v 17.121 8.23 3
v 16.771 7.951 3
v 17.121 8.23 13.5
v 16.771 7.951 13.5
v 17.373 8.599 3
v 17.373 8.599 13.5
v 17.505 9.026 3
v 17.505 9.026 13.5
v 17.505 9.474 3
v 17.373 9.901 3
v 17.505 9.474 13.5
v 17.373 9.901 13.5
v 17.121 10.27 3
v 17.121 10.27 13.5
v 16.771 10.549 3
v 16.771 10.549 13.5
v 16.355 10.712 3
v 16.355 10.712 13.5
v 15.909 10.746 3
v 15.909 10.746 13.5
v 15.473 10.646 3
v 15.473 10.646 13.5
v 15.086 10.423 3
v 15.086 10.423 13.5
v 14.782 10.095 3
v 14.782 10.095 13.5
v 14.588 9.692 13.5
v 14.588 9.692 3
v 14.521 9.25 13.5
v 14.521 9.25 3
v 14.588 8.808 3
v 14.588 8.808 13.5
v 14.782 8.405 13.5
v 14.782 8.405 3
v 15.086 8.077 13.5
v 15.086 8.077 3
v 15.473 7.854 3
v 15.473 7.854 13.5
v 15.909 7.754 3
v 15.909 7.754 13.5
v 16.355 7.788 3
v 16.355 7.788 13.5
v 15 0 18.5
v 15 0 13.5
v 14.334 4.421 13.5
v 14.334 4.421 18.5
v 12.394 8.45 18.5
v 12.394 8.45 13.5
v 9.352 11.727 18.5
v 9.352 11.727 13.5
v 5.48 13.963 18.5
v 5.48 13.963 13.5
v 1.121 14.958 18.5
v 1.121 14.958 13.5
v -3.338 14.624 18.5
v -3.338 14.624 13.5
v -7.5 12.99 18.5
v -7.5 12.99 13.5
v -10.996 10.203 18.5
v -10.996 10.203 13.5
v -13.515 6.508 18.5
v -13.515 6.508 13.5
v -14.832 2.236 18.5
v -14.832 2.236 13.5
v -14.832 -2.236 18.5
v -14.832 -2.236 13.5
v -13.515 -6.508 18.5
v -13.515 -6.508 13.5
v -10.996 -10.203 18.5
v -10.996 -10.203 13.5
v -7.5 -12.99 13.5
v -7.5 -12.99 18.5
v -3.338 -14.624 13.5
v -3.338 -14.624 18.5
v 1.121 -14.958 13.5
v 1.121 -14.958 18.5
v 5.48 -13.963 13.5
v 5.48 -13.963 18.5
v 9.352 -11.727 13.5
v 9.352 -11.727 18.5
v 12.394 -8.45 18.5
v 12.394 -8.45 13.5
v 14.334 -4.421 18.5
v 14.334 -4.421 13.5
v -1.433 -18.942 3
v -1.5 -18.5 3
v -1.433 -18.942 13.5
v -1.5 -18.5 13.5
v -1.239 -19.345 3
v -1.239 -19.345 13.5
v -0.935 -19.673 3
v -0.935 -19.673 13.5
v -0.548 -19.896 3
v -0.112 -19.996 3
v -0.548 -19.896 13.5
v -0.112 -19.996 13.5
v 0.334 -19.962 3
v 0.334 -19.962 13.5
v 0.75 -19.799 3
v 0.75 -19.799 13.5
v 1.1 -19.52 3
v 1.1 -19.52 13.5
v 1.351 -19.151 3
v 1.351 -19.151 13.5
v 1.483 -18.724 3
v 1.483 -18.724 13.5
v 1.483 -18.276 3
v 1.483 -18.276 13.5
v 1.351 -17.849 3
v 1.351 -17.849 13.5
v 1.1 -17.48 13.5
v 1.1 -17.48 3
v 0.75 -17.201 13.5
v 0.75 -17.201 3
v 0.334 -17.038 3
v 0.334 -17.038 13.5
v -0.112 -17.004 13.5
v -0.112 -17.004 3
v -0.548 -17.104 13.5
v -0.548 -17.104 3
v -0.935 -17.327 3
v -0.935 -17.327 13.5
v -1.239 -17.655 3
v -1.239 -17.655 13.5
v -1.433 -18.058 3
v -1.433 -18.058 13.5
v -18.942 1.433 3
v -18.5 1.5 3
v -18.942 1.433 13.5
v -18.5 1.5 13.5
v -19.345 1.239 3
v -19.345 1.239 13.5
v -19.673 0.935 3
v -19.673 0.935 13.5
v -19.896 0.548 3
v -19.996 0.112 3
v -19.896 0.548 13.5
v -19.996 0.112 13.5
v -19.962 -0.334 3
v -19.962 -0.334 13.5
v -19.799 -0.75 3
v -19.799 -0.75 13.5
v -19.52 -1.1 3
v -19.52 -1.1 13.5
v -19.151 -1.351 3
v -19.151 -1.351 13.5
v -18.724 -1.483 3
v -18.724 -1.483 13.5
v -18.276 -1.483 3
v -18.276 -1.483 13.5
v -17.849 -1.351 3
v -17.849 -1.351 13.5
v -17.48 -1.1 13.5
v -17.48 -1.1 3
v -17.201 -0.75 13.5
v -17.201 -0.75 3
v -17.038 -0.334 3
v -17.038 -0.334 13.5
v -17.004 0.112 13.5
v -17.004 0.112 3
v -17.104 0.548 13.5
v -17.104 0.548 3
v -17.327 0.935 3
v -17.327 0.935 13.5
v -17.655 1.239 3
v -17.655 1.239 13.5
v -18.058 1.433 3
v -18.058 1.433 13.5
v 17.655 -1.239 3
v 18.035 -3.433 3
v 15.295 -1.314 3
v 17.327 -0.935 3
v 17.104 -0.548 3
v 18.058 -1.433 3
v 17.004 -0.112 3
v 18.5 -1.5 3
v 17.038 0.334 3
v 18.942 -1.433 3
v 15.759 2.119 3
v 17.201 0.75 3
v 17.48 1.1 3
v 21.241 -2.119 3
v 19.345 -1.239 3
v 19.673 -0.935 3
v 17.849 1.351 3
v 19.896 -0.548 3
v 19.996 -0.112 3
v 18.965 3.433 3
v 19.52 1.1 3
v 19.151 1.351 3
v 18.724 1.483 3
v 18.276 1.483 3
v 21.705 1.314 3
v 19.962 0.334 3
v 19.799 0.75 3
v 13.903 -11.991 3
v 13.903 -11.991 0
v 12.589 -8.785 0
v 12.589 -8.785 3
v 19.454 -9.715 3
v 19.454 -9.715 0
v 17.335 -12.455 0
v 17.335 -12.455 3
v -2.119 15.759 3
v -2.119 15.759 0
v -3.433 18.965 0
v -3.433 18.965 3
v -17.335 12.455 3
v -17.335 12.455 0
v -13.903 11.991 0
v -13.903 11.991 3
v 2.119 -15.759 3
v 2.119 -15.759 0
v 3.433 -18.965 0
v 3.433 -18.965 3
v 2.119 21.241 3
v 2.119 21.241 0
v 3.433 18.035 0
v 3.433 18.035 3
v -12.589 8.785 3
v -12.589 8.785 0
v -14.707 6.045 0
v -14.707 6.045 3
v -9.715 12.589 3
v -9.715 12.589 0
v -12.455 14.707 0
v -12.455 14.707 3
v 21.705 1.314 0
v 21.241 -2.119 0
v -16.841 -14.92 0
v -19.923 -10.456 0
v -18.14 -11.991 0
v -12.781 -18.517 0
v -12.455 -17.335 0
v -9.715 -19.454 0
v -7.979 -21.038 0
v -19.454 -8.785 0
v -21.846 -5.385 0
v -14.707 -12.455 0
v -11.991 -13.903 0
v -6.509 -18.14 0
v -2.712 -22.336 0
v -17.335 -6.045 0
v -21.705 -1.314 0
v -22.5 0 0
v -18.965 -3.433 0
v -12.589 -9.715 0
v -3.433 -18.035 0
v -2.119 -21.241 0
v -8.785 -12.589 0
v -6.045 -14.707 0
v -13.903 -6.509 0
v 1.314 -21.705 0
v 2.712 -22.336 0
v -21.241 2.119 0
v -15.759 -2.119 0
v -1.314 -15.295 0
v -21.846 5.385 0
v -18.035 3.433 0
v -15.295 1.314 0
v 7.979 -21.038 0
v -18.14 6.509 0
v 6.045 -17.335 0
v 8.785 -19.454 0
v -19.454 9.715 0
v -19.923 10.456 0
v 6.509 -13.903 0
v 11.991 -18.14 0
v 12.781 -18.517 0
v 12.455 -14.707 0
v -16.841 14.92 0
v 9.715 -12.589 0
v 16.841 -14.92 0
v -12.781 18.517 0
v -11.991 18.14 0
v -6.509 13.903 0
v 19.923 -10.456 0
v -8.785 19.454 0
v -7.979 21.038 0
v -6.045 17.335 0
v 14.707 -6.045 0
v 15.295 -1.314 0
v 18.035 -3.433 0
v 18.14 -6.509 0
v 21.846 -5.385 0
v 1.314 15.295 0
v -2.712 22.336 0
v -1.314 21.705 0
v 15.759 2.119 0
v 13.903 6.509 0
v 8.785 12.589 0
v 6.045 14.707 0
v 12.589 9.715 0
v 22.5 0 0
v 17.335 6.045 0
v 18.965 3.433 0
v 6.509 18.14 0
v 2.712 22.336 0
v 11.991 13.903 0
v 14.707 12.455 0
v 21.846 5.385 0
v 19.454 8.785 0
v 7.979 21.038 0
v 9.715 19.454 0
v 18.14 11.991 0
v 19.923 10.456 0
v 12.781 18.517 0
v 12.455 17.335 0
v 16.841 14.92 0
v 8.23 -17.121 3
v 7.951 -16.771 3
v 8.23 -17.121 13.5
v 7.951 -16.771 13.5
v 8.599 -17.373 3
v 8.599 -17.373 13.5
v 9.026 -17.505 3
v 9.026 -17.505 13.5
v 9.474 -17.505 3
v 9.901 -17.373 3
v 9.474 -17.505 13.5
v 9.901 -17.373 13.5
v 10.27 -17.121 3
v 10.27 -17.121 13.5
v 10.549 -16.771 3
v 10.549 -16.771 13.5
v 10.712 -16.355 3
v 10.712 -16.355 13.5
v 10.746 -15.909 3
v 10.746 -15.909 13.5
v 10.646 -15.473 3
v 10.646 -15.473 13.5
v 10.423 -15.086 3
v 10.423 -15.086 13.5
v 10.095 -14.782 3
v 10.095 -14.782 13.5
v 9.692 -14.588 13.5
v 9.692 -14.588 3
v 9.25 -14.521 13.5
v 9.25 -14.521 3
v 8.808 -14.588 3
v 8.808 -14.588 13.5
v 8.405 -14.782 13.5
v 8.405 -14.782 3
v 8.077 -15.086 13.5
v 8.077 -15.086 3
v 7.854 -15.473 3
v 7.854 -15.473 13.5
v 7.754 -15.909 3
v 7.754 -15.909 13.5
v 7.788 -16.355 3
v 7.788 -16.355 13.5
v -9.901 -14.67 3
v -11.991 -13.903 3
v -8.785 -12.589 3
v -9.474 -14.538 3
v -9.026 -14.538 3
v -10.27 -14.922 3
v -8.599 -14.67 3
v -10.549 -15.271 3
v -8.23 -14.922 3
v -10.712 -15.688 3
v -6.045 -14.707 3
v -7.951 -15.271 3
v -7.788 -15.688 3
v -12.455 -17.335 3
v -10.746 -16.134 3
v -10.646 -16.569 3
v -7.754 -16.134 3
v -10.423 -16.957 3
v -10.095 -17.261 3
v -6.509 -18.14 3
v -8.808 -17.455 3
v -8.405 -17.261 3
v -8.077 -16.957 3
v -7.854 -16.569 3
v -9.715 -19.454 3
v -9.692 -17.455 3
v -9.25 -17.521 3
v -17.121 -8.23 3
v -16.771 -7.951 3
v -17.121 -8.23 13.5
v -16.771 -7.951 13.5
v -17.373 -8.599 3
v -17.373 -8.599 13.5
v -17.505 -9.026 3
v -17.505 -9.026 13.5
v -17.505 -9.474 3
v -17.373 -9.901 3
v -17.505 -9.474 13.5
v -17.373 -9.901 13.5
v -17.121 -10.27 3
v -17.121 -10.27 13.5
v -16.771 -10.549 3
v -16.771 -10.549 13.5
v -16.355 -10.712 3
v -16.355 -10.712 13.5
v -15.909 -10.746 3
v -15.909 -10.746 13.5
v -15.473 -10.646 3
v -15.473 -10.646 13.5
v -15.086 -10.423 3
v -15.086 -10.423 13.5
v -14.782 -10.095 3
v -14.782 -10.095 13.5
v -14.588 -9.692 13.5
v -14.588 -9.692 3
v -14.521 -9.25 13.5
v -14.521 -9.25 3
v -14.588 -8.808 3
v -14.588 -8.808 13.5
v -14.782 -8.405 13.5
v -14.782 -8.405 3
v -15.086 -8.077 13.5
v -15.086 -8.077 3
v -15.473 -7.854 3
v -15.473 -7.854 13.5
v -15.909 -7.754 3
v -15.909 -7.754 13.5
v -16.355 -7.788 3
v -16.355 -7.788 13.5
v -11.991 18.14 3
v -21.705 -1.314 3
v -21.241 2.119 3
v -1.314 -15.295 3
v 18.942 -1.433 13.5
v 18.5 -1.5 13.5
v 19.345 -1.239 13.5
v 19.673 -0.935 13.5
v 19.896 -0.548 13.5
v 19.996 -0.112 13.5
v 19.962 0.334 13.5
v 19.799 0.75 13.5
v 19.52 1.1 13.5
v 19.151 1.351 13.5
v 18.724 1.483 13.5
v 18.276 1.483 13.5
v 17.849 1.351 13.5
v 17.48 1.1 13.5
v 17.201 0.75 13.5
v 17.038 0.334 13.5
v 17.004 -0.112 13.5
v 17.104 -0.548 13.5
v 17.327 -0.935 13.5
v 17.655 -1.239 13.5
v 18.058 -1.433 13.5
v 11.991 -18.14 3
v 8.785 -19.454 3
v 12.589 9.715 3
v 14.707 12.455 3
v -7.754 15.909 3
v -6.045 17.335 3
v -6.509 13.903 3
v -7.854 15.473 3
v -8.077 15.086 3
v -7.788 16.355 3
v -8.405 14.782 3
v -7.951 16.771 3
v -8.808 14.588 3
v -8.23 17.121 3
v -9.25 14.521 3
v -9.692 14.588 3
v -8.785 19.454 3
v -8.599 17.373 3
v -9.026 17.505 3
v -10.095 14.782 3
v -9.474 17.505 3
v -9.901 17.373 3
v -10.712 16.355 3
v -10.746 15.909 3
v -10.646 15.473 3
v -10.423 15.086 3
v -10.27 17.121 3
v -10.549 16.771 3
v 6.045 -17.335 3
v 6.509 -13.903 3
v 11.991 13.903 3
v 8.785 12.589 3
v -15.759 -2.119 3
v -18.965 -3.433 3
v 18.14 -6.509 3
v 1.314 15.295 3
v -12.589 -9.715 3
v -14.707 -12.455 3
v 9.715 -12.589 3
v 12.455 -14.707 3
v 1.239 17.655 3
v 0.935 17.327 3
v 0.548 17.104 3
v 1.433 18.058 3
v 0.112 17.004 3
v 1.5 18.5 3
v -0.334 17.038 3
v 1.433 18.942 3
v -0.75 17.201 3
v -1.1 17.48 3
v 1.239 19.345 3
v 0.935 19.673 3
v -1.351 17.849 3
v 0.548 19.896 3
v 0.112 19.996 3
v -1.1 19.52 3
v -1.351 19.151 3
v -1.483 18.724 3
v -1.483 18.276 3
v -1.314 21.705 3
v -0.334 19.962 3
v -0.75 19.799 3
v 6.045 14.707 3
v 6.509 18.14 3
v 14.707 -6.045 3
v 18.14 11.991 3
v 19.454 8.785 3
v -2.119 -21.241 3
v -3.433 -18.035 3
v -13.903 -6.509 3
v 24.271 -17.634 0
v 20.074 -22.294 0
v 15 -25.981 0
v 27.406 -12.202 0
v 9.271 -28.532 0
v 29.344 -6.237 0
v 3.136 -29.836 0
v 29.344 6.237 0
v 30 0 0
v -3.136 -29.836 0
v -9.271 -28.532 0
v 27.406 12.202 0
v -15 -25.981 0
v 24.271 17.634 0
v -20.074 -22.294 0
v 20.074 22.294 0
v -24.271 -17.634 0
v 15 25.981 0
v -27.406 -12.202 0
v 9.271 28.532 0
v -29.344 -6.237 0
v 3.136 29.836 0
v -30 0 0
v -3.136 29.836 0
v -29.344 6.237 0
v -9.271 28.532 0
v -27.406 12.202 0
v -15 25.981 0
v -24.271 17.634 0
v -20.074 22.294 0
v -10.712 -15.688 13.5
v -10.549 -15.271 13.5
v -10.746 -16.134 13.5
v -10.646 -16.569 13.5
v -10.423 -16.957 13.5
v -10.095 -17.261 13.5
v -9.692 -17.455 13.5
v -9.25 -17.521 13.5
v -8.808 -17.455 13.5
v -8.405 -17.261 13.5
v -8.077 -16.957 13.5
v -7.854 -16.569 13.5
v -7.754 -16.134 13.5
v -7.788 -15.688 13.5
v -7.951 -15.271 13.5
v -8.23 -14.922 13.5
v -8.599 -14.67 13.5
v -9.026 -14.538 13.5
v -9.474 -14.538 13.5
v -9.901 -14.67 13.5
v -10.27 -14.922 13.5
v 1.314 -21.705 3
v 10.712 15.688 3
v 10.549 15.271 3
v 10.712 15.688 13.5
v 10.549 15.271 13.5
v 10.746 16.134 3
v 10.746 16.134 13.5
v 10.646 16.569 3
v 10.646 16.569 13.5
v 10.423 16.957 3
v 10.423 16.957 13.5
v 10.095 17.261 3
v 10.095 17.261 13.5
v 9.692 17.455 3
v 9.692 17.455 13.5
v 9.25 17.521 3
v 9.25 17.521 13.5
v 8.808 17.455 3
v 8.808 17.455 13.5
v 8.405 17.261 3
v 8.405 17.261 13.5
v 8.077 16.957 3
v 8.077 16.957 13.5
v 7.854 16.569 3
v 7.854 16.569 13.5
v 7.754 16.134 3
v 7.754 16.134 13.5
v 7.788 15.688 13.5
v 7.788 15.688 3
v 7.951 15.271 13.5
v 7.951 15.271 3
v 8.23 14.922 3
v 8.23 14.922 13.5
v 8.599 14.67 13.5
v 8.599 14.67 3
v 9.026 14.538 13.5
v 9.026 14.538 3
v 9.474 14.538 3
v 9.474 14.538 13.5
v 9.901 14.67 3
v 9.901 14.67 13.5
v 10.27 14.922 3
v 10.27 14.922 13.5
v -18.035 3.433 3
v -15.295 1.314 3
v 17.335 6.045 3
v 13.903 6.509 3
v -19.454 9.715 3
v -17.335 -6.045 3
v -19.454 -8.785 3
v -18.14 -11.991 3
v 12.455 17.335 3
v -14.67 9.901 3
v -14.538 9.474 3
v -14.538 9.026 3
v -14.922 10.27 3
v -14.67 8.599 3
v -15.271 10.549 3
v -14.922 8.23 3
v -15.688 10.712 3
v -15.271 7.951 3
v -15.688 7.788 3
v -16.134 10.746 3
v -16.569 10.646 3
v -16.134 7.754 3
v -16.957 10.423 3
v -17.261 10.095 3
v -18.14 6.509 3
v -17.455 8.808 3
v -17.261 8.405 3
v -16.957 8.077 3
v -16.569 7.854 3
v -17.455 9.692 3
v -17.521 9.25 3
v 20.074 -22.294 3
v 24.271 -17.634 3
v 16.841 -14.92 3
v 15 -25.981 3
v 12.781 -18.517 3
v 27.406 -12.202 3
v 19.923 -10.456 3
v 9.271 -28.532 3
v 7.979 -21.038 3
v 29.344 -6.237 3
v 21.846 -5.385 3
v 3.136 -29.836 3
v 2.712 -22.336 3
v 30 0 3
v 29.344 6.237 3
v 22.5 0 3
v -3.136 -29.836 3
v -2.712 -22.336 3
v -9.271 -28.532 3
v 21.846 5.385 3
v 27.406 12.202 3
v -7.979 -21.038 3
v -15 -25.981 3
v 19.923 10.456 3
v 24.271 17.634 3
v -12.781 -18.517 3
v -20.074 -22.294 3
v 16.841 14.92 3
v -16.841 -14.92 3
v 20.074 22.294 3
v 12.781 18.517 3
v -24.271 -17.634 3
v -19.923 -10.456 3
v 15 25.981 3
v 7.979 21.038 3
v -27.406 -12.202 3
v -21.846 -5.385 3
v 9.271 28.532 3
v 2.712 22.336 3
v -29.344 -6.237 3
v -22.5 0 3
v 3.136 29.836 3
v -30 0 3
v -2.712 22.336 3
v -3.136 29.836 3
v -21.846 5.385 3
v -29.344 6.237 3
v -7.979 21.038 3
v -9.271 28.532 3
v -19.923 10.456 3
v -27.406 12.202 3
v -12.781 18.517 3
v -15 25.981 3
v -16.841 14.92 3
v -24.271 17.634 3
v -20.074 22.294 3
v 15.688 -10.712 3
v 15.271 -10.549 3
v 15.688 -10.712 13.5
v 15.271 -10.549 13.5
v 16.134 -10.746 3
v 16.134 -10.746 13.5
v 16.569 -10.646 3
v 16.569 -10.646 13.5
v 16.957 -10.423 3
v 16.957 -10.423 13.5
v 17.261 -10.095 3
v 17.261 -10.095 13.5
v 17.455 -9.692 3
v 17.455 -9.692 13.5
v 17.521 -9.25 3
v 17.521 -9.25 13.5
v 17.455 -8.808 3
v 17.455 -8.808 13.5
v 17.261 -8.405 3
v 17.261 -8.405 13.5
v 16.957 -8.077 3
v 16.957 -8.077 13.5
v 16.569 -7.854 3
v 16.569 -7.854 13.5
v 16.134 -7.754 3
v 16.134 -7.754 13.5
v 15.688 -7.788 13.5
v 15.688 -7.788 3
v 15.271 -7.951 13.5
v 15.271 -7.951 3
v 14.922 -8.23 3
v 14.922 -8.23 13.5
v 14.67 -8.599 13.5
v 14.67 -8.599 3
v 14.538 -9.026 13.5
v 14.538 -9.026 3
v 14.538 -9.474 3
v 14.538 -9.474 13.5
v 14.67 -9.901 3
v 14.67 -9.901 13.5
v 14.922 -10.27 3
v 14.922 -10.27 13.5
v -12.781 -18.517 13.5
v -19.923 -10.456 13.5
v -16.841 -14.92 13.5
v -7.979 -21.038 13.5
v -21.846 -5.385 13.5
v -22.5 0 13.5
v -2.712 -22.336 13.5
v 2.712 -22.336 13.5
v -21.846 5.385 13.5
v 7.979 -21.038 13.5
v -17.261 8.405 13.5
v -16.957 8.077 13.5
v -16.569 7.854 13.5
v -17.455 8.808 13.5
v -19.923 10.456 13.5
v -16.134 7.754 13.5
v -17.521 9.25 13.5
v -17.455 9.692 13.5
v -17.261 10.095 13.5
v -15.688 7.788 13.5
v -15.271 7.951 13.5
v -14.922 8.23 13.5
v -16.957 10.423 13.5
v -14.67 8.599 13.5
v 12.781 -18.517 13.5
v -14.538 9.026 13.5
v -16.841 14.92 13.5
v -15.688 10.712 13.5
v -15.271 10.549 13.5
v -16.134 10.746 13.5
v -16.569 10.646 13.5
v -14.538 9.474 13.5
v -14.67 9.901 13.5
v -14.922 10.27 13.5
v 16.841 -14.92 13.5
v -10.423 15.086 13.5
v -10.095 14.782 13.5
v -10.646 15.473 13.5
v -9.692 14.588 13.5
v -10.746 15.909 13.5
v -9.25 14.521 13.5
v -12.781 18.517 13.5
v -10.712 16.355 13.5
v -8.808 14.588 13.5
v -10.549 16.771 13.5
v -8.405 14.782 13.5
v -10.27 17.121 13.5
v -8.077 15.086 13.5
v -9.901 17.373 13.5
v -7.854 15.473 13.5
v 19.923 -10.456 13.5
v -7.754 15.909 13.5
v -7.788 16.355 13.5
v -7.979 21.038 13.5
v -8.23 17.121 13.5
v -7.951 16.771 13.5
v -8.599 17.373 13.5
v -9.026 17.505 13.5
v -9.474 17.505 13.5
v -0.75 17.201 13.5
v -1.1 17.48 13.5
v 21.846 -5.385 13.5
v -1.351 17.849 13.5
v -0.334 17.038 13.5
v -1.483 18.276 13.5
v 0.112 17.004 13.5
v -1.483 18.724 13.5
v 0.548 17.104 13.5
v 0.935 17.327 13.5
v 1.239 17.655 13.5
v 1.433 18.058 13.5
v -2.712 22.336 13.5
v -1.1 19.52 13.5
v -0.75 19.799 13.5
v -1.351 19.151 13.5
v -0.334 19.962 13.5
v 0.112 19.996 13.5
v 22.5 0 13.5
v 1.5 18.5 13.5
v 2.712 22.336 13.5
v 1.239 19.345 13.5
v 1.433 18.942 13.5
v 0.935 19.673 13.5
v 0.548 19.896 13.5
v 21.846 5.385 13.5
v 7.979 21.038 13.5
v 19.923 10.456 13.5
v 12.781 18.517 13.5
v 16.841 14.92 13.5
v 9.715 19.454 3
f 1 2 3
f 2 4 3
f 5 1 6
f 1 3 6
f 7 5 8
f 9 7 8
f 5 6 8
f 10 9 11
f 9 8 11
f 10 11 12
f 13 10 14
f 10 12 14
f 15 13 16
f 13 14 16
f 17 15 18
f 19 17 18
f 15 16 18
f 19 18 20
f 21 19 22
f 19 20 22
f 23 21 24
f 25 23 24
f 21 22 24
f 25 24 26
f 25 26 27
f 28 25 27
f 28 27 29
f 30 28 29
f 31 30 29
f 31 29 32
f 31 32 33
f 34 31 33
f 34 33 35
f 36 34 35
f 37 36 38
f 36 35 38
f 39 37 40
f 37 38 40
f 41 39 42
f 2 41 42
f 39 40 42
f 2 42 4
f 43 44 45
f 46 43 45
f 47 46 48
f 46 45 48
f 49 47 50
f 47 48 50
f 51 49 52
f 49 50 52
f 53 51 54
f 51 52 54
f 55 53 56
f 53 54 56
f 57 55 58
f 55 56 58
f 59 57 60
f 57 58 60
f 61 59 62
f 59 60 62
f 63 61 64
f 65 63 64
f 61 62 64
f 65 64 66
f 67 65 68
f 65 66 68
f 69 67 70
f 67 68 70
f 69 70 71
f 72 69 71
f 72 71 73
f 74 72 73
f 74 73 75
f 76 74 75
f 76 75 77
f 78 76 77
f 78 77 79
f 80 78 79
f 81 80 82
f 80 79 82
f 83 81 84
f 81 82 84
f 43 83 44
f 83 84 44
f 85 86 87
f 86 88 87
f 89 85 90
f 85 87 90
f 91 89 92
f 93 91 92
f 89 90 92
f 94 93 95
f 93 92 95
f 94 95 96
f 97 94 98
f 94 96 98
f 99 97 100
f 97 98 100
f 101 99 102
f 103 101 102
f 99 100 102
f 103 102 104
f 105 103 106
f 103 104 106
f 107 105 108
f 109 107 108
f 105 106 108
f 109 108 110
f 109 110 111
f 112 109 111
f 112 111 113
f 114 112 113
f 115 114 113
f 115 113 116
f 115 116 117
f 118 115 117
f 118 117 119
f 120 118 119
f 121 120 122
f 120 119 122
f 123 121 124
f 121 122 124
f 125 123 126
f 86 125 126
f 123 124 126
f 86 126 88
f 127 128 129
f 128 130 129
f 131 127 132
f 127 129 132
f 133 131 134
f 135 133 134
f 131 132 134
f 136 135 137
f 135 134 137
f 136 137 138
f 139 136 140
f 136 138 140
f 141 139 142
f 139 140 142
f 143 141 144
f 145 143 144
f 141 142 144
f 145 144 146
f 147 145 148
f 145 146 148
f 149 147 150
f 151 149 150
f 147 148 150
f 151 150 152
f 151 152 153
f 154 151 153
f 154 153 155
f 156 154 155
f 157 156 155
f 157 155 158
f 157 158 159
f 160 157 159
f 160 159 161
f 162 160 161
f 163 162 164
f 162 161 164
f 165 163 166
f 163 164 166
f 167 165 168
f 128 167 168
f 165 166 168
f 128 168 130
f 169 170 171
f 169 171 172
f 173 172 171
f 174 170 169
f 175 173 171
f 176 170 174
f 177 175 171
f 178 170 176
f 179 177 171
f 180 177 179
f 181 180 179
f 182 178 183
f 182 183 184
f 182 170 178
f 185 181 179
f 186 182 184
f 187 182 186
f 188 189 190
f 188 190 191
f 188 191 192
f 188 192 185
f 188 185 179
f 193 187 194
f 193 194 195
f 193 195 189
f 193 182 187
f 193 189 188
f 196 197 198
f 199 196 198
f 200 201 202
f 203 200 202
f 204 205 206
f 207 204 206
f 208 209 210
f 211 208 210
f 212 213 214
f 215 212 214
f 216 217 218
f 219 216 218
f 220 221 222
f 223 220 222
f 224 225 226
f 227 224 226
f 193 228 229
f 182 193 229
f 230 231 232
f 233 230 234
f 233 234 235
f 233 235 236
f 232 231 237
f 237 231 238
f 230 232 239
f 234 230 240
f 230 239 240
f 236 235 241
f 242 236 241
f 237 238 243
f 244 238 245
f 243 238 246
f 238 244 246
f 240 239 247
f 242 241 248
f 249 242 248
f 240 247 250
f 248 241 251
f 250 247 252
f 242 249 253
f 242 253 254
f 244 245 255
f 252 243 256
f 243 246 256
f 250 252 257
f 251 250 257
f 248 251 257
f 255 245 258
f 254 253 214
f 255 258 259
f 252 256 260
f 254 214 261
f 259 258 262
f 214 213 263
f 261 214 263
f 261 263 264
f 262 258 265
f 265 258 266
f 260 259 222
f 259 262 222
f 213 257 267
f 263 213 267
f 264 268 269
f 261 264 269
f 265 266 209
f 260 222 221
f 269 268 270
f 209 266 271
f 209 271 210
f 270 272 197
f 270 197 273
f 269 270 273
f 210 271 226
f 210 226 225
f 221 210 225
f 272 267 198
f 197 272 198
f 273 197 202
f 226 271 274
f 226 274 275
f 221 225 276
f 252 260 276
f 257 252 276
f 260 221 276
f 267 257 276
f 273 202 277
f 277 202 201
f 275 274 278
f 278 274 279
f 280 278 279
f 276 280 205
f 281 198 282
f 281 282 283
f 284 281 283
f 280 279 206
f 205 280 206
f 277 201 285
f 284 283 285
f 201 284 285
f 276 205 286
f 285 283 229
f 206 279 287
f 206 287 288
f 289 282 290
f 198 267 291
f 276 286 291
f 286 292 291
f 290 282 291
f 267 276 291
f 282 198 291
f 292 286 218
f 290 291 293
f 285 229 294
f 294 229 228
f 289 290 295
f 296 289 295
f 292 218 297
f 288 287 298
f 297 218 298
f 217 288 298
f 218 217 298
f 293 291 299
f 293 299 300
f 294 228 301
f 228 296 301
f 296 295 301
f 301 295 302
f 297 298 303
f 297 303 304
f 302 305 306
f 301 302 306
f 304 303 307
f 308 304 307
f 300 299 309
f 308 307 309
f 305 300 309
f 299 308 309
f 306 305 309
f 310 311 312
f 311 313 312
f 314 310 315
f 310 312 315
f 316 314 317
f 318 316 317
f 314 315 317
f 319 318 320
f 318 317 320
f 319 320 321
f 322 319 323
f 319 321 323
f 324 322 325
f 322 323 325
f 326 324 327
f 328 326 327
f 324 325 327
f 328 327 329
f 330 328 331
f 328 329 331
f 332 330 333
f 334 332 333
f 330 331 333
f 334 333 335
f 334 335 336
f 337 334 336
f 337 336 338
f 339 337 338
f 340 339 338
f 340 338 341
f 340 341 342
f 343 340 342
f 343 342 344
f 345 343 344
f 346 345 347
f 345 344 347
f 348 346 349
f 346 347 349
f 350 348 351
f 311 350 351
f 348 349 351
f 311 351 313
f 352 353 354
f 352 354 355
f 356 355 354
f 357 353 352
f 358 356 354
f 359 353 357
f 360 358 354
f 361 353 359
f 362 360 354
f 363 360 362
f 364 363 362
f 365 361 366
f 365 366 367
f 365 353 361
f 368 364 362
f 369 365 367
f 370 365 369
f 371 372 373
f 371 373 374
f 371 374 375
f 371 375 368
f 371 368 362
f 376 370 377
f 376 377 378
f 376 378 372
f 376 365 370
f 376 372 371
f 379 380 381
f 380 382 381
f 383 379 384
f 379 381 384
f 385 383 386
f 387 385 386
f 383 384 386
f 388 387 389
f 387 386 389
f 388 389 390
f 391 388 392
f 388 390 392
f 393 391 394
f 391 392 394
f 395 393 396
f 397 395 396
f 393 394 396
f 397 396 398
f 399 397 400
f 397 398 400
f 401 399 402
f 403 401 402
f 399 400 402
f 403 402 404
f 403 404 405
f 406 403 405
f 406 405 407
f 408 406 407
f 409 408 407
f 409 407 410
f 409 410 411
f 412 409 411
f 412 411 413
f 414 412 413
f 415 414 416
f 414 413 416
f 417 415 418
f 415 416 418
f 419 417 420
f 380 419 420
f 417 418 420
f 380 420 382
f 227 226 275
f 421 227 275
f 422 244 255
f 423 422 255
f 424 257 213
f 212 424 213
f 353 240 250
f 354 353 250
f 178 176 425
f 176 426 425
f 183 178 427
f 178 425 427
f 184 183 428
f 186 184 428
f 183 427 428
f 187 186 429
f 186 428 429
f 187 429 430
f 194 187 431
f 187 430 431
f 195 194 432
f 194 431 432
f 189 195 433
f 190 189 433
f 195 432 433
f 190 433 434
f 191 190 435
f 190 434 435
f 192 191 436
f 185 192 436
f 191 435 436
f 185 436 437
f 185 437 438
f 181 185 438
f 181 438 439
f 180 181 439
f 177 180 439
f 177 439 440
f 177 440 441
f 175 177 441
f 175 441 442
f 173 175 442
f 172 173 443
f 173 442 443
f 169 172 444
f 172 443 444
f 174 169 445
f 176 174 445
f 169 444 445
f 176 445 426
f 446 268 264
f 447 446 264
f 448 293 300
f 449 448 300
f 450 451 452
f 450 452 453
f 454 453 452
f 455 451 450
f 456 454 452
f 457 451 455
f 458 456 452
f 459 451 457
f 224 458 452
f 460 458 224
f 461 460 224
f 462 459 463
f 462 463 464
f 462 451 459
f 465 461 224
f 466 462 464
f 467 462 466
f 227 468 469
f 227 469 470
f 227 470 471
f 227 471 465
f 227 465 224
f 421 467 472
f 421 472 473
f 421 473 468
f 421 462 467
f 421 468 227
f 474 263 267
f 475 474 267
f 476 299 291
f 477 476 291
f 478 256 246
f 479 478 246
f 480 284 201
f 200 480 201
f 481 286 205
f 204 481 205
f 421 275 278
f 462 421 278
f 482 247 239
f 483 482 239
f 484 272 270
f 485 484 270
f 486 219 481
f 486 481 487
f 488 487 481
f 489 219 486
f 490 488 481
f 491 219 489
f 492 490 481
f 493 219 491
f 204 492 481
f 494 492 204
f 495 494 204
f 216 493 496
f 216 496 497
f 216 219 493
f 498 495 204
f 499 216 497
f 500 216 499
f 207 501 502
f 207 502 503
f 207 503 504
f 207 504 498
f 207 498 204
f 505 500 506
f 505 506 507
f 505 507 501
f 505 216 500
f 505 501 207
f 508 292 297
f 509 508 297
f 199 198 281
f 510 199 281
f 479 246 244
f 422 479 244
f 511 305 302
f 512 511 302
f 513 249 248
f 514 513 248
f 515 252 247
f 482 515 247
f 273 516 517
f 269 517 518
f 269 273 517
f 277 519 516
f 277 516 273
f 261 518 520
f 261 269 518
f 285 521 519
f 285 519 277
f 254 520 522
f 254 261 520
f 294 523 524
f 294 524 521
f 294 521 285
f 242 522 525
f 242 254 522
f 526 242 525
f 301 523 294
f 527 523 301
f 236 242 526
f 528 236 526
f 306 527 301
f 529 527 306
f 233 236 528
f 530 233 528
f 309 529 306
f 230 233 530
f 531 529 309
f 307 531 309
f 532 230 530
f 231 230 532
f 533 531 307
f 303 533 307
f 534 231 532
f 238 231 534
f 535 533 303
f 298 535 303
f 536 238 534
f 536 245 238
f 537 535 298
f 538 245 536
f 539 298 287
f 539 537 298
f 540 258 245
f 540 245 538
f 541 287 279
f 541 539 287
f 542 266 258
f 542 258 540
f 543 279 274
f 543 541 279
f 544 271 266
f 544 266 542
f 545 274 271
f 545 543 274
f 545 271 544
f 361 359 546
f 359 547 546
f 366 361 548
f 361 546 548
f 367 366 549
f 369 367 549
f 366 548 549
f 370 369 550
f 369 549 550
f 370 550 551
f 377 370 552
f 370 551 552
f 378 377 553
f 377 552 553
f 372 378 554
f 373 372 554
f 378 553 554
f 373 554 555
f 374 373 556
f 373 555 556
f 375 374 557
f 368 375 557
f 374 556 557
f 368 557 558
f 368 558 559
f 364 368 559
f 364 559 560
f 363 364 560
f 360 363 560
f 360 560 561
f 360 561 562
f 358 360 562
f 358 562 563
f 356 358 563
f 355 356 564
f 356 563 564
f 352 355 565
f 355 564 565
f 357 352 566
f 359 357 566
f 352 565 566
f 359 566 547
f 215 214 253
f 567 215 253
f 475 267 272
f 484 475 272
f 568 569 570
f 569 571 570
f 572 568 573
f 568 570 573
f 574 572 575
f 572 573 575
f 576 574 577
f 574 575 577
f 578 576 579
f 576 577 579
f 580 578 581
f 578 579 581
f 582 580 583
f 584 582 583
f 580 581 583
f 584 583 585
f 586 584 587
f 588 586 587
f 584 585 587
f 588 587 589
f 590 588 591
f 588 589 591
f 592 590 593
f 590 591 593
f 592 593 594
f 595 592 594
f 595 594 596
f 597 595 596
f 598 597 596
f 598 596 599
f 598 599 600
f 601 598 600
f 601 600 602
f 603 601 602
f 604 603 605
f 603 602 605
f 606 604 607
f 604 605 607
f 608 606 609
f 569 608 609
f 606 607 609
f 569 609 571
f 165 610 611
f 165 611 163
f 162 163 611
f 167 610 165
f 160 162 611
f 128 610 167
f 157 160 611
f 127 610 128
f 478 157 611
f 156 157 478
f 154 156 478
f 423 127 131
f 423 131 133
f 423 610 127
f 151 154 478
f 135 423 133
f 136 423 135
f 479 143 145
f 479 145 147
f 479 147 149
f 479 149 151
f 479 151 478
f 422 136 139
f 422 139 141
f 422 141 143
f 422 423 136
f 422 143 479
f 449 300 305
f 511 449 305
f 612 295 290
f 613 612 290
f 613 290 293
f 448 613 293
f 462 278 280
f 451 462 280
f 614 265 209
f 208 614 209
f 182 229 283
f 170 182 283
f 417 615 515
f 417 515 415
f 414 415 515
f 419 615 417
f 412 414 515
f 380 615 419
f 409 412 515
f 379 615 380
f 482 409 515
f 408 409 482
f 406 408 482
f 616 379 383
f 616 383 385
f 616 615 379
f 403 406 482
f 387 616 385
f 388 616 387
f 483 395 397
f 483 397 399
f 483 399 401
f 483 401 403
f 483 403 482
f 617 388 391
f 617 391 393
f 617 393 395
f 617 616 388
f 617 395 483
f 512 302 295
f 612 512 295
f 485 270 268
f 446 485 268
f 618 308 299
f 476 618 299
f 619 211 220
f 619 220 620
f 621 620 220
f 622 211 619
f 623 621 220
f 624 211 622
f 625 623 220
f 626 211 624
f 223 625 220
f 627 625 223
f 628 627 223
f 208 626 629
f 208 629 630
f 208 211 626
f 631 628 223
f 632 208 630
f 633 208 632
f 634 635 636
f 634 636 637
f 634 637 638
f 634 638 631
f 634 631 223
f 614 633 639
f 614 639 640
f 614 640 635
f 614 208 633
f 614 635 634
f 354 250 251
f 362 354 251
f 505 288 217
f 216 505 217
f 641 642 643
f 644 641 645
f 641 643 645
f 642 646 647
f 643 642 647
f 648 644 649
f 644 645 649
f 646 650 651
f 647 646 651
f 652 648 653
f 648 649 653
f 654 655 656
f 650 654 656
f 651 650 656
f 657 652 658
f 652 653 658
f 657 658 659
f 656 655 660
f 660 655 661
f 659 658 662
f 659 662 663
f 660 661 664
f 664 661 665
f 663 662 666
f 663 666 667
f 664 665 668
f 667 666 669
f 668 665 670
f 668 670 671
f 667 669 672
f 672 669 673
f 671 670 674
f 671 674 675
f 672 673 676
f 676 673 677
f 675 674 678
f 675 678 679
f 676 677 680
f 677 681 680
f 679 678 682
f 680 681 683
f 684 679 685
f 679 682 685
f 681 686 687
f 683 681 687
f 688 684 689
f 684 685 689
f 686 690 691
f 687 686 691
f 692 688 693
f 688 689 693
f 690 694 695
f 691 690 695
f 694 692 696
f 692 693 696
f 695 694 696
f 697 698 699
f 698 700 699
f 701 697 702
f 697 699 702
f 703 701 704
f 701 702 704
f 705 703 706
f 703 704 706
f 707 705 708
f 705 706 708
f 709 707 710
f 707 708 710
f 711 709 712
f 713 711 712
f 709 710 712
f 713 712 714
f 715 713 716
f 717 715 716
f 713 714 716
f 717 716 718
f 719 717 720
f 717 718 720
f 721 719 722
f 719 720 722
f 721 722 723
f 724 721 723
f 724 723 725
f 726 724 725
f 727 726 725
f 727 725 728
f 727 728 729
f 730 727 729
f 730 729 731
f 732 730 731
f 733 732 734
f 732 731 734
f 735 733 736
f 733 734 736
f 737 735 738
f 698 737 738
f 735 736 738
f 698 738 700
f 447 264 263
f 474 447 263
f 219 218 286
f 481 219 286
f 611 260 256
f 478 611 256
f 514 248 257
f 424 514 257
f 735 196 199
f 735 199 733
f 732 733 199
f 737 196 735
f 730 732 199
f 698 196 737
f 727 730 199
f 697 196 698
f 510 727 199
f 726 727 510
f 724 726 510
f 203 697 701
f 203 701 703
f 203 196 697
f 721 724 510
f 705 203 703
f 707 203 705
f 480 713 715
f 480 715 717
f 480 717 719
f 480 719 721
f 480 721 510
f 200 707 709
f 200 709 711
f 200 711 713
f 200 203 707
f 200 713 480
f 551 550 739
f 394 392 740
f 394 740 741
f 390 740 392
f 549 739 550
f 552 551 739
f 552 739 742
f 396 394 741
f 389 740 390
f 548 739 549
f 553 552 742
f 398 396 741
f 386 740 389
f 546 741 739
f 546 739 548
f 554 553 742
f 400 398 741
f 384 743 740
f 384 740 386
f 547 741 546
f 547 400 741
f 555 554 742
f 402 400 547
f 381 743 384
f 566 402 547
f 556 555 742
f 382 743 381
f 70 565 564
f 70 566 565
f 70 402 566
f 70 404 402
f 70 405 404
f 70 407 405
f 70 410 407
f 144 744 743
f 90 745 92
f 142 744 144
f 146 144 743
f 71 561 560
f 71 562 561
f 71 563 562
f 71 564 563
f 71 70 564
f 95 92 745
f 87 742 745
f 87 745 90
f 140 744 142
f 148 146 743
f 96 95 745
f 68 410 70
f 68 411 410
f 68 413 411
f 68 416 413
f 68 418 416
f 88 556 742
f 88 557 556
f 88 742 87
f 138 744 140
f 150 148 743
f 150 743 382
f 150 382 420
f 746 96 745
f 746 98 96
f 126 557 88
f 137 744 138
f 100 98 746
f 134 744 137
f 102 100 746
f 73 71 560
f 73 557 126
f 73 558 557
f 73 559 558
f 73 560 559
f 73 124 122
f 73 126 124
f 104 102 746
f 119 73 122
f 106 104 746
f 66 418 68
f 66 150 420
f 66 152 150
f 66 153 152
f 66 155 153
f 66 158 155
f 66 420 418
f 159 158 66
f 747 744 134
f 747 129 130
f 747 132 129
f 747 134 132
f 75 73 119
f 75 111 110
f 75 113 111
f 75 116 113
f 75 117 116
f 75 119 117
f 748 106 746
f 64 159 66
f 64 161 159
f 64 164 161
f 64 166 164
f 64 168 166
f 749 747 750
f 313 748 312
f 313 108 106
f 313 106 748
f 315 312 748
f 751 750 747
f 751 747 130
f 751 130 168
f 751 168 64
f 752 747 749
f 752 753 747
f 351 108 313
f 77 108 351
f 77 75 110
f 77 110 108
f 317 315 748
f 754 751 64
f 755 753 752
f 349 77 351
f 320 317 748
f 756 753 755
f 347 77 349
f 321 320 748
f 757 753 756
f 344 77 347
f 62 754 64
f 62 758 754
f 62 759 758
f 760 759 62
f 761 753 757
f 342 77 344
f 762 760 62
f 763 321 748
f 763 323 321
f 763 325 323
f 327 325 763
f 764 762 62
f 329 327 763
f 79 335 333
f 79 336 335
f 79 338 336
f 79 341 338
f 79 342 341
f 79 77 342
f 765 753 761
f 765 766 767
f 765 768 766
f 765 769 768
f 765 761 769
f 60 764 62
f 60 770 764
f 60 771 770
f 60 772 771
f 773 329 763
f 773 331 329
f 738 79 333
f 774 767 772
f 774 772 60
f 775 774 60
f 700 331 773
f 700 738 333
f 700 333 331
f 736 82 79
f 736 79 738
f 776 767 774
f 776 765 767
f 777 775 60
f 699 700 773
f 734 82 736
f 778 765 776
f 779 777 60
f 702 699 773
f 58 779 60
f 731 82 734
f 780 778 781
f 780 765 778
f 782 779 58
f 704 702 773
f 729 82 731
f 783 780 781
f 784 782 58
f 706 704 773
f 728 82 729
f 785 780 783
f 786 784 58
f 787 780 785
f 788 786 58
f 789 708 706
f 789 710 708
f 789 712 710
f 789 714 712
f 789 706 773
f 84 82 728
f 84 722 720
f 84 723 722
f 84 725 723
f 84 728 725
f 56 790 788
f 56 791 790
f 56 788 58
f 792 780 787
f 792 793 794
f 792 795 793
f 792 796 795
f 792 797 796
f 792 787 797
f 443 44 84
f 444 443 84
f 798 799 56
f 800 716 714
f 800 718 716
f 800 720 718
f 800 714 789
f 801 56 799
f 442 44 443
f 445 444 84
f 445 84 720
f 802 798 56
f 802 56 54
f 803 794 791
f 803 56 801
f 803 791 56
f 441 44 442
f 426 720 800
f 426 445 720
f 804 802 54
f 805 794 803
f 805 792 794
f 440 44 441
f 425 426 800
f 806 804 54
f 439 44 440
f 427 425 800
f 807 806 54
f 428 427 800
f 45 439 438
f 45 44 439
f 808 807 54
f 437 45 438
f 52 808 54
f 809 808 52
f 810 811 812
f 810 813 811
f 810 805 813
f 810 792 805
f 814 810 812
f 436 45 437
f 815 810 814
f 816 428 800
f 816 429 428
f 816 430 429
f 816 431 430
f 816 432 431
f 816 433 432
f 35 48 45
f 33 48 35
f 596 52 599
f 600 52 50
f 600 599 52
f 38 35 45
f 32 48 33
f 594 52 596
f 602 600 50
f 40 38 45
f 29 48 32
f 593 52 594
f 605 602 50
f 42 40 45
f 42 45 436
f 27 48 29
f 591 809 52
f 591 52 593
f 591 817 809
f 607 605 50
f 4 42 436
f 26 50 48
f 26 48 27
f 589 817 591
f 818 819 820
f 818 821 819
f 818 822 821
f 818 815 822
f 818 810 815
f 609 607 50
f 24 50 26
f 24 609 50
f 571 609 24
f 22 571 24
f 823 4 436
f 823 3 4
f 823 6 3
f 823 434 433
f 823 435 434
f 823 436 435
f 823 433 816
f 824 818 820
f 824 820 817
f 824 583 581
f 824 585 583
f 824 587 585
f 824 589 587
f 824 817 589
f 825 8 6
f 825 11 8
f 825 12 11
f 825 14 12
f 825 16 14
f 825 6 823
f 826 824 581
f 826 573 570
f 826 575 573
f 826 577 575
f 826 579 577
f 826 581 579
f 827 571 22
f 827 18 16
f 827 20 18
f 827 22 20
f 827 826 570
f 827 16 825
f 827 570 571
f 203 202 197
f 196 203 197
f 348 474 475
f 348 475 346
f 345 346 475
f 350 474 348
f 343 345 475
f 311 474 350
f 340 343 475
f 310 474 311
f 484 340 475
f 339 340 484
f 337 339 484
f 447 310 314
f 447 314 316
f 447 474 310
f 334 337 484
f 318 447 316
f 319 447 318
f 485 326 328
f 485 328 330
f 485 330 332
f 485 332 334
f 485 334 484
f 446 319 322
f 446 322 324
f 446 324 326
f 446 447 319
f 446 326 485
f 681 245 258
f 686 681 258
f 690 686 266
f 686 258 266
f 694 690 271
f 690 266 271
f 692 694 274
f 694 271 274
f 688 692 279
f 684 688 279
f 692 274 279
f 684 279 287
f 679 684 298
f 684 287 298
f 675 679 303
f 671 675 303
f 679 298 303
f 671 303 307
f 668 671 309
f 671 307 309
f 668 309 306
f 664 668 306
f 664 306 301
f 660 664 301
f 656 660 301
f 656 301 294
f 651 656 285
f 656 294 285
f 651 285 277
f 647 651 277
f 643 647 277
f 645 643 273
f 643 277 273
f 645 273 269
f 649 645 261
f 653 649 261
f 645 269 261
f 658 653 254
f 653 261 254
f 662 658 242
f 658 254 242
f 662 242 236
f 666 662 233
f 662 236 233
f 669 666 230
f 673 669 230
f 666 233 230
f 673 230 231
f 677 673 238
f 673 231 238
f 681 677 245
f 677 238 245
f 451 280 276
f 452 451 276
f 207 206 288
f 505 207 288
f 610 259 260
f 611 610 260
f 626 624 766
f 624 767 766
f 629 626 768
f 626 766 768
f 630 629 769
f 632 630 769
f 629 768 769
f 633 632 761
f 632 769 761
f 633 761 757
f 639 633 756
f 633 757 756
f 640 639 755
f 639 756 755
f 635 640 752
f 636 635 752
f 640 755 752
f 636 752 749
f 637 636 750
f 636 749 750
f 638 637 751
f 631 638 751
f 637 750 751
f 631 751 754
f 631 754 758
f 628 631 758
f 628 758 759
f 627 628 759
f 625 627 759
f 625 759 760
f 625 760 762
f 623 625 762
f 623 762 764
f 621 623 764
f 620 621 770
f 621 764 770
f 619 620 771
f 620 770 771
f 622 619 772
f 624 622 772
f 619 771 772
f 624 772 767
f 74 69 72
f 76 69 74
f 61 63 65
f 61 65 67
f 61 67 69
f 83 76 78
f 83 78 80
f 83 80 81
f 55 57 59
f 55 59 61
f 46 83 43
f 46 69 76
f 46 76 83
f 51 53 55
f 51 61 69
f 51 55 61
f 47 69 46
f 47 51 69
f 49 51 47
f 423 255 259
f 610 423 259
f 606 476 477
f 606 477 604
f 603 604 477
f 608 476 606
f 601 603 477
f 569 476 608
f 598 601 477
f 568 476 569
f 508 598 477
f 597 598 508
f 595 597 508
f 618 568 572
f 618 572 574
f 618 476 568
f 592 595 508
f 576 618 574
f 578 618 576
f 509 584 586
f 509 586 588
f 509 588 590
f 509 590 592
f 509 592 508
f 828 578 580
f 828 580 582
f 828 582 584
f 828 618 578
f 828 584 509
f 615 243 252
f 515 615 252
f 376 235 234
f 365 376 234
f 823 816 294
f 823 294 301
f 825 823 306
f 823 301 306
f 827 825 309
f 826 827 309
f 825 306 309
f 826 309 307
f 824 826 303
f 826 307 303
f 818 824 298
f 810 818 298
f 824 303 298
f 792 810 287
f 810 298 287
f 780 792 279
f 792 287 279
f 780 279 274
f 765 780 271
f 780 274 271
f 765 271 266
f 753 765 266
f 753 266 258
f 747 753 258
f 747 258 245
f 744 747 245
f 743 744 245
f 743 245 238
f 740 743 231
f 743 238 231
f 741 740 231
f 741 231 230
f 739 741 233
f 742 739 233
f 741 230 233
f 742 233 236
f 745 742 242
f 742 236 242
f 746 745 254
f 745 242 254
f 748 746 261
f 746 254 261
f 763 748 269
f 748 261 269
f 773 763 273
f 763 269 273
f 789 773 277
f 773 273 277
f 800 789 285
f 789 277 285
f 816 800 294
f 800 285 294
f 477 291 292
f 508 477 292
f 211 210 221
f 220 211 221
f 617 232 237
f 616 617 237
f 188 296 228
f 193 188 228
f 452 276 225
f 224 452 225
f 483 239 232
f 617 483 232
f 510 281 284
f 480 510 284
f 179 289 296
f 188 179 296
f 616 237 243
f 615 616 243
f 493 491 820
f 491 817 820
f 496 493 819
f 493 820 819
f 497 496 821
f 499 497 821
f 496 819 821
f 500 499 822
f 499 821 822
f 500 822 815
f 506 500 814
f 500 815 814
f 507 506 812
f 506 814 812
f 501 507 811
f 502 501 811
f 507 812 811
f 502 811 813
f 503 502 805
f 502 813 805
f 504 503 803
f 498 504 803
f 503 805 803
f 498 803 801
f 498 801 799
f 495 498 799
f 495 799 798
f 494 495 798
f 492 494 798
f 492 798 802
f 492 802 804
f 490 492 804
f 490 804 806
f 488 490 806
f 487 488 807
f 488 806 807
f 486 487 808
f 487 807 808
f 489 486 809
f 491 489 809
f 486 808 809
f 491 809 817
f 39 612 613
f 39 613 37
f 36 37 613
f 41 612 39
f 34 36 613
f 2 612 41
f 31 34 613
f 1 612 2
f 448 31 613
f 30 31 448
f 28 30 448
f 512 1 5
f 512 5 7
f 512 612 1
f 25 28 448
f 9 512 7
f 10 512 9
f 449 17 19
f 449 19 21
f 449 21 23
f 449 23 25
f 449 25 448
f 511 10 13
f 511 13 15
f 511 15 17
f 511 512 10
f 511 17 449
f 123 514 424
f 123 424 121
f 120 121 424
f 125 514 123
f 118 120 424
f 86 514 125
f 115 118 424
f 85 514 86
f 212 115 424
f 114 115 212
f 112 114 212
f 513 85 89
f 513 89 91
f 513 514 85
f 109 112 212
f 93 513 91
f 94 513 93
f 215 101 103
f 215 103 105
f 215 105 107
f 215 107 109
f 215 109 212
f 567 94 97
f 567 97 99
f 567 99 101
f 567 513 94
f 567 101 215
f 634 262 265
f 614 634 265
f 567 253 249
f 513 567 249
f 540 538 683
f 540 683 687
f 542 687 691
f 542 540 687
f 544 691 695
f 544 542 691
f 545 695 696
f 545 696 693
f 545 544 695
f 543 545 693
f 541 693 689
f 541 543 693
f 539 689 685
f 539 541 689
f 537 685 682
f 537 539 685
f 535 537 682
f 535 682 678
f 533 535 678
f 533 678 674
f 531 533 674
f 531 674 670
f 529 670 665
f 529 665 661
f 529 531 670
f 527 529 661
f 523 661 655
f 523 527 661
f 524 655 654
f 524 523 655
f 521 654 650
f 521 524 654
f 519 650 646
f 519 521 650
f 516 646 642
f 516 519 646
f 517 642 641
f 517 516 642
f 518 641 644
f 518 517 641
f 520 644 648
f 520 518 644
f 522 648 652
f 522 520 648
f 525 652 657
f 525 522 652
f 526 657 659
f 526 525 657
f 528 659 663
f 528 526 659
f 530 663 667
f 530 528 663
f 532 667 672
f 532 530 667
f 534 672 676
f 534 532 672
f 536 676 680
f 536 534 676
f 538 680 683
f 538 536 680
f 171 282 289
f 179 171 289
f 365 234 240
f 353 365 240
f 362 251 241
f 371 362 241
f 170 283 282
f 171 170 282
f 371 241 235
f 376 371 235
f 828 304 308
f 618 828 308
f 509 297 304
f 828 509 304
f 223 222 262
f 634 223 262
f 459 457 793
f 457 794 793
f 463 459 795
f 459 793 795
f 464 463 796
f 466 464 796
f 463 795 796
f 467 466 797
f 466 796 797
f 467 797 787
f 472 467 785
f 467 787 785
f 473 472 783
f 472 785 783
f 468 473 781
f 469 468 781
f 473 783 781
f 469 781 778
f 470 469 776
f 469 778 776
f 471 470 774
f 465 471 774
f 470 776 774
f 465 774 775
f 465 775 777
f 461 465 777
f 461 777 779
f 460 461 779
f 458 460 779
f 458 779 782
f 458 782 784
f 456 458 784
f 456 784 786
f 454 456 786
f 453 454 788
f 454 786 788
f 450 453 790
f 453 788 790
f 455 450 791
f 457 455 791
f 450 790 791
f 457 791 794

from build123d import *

# Parameters (mm, degrees)
SKETCH_1_R               = 22.5
EXTRUDE_1_DEPTH          = 13.5
SKETCH_2_R               = 15
EXTRUDE_2_DEPTH          = 5
SKETCH_3_R               = 1.5
CUT_EXTRUDE_1_DEPTH      = 5
SKETCH_5_R               = 1.5
CUT_EXTRUDE_2_DEPTH      = 35.565155865
CUT_EXTRUDE_6_DEPTH      = 3
PATTERN_CIRCULAR_1_COUNT = 12
SKETCH_10_R              = 30
SKETCH_10_R_2            = 22.5
EXTRUDE_3_DEPTH          = 3


with BuildPart() as part:
    # 草图1 → 凸台-拉伸1 (new body)
    with BuildSketch(Plane.XY):
        Circle(SKETCH_1_R)
    extrude(amount=EXTRUDE_1_DEPTH)

    # 草图2 → 凸台-拉伸2 (add)
    with BuildSketch(Plane.XY.offset(13.5)):
        Circle(SKETCH_2_R)
    extrude(amount=EXTRUDE_2_DEPTH)

    # 草图3 → 切除-拉伸1 (cut)
    with BuildSketch(Plane.XY.offset(13.5)):
        with Locations((0, 18.5)):
            Circle(SKETCH_3_R)
    cut_extrude_1 = extrude(amount=-CUT_EXTRUDE_1_DEPTH, mode=Mode.SUBTRACT)

    # 草图5 → 切除-拉伸2 (cut, through all)
    with BuildSketch(Plane.XY.offset(13.5)):
        with Locations((0, 18.5)):
            Circle(SKETCH_5_R)
    cut_extrude_2 = extrude(amount=-CUT_EXTRUDE_2_DEPTH, mode=Mode.SUBTRACT)

    # 草图9 → 切除-拉伸6 (cut)
    with BuildSketch(Plane(origin=(0, 0, 0), x_dir=(-1, 0, 0), z_dir=(0, 0, -1))):
        Polygon((1.313991975, 21.705218415), (-2.118804585, 21.240559639), (-3.43279656, 18.035341223), (-1.313991975, 15.294781585), (2.118804585, 15.759440361), (3.43279656, 18.964658777), align=None)
    cut_extrude_6 = extrude(amount=-CUT_EXTRUDE_6_DEPTH, mode=Mode.SUBTRACT)

    # 阵列(圆周)1: 切除-拉伸1, 切除-拉伸2, 切除-拉伸6 ×12 about axis
    pattern_circular_1_axis = Axis((0, 0, 0), (0, 0, 1))
    add([cut_extrude_1.rotate(pattern_circular_1_axis, i * 360 / PATTERN_CIRCULAR_1_COUNT) for i in range(1, PATTERN_CIRCULAR_1_COUNT)], mode=Mode.SUBTRACT)
    add([cut_extrude_2.rotate(pattern_circular_1_axis, i * 360 / PATTERN_CIRCULAR_1_COUNT) for i in range(1, PATTERN_CIRCULAR_1_COUNT)], mode=Mode.SUBTRACT)
    add([cut_extrude_6.rotate(pattern_circular_1_axis, i * 360 / PATTERN_CIRCULAR_1_COUNT) for i in range(1, PATTERN_CIRCULAR_1_COUNT)], mode=Mode.SUBTRACT)


with BuildPart() as body_2:
    # 草图10 → 凸台-拉伸3 (new body)
    with BuildSketch(Plane(origin=(0, 0, 0), x_dir=(-1, 0, 0), z_dir=(0, 0, -1))):
        Circle(SKETCH_10_R)
        Circle(SKETCH_10_R_2, mode=Mode.SUBTRACT)
    extrude(amount=-EXTRUDE_3_DEPTH)


solid = Compound([part.part, body_2.part])
